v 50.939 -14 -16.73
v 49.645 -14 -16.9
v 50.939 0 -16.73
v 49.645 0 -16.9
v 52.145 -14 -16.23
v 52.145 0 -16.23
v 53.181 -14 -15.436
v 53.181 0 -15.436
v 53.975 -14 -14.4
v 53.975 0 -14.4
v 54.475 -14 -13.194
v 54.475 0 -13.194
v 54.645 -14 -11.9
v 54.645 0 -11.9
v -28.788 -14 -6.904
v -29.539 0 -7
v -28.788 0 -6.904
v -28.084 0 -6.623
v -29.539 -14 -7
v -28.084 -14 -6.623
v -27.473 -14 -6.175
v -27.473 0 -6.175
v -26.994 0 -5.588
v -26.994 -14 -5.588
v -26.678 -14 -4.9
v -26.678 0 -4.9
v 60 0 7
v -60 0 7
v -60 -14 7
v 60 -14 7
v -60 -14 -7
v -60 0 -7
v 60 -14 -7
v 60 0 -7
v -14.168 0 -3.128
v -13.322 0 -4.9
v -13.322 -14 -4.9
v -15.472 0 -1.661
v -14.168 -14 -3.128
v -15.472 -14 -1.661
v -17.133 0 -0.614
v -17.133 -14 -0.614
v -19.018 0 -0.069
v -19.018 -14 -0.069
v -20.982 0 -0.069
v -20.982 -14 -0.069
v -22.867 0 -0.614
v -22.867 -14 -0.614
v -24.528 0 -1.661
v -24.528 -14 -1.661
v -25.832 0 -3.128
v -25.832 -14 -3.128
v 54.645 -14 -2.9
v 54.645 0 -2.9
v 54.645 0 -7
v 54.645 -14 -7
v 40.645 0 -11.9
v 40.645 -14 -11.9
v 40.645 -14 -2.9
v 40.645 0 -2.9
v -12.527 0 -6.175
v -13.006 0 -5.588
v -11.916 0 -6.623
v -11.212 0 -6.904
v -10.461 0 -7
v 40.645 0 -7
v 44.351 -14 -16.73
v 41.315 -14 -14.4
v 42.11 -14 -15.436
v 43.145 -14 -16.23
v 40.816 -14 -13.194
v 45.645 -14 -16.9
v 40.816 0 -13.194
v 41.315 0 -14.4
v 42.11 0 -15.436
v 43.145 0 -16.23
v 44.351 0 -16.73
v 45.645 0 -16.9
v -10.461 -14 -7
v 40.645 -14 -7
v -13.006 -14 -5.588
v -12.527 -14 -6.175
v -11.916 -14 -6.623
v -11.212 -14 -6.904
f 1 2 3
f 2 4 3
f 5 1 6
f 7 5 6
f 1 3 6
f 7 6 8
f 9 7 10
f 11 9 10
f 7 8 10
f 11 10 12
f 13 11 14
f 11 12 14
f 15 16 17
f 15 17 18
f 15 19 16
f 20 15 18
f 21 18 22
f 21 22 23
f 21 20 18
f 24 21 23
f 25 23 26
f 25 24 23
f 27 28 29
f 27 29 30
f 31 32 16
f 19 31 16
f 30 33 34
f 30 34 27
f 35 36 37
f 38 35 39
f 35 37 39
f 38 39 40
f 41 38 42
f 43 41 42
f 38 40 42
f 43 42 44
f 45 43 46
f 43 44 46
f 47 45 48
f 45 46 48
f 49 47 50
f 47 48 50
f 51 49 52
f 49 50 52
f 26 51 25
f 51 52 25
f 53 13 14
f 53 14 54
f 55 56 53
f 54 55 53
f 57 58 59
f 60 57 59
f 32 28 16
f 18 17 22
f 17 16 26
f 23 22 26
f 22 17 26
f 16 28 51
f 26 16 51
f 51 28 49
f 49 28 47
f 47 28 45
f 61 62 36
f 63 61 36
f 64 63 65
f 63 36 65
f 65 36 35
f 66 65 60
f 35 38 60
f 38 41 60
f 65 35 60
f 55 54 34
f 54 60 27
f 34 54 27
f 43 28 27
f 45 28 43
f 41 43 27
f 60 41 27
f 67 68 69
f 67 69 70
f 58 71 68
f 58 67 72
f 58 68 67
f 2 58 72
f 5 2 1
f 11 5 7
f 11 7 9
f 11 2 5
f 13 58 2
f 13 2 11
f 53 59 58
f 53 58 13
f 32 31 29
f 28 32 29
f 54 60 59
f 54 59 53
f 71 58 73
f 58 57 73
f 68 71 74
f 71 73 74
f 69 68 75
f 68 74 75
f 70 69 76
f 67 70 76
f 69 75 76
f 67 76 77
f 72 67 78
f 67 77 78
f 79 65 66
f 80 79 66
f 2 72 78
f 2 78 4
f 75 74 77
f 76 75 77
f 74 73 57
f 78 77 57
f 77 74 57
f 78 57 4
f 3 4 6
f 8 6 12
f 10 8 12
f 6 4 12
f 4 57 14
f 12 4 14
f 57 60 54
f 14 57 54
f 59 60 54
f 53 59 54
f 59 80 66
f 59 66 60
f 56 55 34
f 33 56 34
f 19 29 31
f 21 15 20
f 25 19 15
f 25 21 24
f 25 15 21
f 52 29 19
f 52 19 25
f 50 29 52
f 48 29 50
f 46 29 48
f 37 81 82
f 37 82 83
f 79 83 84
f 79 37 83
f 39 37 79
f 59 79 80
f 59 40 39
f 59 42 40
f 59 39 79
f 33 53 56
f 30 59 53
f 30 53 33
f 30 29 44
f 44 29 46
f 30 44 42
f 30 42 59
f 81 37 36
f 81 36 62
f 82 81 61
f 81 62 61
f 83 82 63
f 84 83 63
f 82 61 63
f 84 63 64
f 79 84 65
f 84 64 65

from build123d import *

# Parameters (mm, degrees)
F0_W     = 120
F0_H     = 14
F1_DEPTH = 14
F2_R     = 7
F3_DEPTH = 14.001
F4_R     = 3
F5_W     = 14
F5_H     = 14
F6_DEPTH = 14.001
F7_DEPTH = 14
F8_R     = 5


with BuildPart() as f1:
    # F0 (on Front) → F1 (new body)
    with BuildSketch(Plane.XZ):
        Rectangle(F0_W, F0_H)
    extrude(amount=F1_DEPTH)

    # F2 (on face) → F3 (cut, through all)
    with BuildSketch(Plane.XZ.offset(14)):
        with Locations((-20, -7)):
            Circle(F2_R)
    extrude(amount=-F3_DEPTH, mode=Mode.SUBTRACT)

    # F4
    f4_edges = [f1.edges().sort_by_distance(p)[0] for p in [
        (-27, -7, -7),
        (-13, -7, -7),
    ]]
    fillet(f4_edges, radius=F4_R)

    # F5 (on face) → F6 (cut, through all)
    with BuildSketch(Plane.XZ.offset(14)):
        with Locations((47.645159781, -9.9)):
            Rectangle(F5_W, F5_H)
    extrude(amount=-F6_DEPTH, mode=Mode.SUBTRACT)


with BuildPart() as f7:
    # F5 (on face) → F7 (new body)
    with BuildSketch(Plane.XZ.offset(14)):
        with Locations((47.645159781, -9.9)):
            Rectangle(F5_W, F5_H)
    extrude(amount=-F7_DEPTH)

    # F8
    f8_edges = [f7.edges().sort_by_distance(p)[0] for p in [
        (54.64516, -7, -16.9),
        (40.64516, -7, -16.9),
    ]]
    fillet(f8_edges, radius=F8_R)


solid = Compound([f1.part, f7.part])
